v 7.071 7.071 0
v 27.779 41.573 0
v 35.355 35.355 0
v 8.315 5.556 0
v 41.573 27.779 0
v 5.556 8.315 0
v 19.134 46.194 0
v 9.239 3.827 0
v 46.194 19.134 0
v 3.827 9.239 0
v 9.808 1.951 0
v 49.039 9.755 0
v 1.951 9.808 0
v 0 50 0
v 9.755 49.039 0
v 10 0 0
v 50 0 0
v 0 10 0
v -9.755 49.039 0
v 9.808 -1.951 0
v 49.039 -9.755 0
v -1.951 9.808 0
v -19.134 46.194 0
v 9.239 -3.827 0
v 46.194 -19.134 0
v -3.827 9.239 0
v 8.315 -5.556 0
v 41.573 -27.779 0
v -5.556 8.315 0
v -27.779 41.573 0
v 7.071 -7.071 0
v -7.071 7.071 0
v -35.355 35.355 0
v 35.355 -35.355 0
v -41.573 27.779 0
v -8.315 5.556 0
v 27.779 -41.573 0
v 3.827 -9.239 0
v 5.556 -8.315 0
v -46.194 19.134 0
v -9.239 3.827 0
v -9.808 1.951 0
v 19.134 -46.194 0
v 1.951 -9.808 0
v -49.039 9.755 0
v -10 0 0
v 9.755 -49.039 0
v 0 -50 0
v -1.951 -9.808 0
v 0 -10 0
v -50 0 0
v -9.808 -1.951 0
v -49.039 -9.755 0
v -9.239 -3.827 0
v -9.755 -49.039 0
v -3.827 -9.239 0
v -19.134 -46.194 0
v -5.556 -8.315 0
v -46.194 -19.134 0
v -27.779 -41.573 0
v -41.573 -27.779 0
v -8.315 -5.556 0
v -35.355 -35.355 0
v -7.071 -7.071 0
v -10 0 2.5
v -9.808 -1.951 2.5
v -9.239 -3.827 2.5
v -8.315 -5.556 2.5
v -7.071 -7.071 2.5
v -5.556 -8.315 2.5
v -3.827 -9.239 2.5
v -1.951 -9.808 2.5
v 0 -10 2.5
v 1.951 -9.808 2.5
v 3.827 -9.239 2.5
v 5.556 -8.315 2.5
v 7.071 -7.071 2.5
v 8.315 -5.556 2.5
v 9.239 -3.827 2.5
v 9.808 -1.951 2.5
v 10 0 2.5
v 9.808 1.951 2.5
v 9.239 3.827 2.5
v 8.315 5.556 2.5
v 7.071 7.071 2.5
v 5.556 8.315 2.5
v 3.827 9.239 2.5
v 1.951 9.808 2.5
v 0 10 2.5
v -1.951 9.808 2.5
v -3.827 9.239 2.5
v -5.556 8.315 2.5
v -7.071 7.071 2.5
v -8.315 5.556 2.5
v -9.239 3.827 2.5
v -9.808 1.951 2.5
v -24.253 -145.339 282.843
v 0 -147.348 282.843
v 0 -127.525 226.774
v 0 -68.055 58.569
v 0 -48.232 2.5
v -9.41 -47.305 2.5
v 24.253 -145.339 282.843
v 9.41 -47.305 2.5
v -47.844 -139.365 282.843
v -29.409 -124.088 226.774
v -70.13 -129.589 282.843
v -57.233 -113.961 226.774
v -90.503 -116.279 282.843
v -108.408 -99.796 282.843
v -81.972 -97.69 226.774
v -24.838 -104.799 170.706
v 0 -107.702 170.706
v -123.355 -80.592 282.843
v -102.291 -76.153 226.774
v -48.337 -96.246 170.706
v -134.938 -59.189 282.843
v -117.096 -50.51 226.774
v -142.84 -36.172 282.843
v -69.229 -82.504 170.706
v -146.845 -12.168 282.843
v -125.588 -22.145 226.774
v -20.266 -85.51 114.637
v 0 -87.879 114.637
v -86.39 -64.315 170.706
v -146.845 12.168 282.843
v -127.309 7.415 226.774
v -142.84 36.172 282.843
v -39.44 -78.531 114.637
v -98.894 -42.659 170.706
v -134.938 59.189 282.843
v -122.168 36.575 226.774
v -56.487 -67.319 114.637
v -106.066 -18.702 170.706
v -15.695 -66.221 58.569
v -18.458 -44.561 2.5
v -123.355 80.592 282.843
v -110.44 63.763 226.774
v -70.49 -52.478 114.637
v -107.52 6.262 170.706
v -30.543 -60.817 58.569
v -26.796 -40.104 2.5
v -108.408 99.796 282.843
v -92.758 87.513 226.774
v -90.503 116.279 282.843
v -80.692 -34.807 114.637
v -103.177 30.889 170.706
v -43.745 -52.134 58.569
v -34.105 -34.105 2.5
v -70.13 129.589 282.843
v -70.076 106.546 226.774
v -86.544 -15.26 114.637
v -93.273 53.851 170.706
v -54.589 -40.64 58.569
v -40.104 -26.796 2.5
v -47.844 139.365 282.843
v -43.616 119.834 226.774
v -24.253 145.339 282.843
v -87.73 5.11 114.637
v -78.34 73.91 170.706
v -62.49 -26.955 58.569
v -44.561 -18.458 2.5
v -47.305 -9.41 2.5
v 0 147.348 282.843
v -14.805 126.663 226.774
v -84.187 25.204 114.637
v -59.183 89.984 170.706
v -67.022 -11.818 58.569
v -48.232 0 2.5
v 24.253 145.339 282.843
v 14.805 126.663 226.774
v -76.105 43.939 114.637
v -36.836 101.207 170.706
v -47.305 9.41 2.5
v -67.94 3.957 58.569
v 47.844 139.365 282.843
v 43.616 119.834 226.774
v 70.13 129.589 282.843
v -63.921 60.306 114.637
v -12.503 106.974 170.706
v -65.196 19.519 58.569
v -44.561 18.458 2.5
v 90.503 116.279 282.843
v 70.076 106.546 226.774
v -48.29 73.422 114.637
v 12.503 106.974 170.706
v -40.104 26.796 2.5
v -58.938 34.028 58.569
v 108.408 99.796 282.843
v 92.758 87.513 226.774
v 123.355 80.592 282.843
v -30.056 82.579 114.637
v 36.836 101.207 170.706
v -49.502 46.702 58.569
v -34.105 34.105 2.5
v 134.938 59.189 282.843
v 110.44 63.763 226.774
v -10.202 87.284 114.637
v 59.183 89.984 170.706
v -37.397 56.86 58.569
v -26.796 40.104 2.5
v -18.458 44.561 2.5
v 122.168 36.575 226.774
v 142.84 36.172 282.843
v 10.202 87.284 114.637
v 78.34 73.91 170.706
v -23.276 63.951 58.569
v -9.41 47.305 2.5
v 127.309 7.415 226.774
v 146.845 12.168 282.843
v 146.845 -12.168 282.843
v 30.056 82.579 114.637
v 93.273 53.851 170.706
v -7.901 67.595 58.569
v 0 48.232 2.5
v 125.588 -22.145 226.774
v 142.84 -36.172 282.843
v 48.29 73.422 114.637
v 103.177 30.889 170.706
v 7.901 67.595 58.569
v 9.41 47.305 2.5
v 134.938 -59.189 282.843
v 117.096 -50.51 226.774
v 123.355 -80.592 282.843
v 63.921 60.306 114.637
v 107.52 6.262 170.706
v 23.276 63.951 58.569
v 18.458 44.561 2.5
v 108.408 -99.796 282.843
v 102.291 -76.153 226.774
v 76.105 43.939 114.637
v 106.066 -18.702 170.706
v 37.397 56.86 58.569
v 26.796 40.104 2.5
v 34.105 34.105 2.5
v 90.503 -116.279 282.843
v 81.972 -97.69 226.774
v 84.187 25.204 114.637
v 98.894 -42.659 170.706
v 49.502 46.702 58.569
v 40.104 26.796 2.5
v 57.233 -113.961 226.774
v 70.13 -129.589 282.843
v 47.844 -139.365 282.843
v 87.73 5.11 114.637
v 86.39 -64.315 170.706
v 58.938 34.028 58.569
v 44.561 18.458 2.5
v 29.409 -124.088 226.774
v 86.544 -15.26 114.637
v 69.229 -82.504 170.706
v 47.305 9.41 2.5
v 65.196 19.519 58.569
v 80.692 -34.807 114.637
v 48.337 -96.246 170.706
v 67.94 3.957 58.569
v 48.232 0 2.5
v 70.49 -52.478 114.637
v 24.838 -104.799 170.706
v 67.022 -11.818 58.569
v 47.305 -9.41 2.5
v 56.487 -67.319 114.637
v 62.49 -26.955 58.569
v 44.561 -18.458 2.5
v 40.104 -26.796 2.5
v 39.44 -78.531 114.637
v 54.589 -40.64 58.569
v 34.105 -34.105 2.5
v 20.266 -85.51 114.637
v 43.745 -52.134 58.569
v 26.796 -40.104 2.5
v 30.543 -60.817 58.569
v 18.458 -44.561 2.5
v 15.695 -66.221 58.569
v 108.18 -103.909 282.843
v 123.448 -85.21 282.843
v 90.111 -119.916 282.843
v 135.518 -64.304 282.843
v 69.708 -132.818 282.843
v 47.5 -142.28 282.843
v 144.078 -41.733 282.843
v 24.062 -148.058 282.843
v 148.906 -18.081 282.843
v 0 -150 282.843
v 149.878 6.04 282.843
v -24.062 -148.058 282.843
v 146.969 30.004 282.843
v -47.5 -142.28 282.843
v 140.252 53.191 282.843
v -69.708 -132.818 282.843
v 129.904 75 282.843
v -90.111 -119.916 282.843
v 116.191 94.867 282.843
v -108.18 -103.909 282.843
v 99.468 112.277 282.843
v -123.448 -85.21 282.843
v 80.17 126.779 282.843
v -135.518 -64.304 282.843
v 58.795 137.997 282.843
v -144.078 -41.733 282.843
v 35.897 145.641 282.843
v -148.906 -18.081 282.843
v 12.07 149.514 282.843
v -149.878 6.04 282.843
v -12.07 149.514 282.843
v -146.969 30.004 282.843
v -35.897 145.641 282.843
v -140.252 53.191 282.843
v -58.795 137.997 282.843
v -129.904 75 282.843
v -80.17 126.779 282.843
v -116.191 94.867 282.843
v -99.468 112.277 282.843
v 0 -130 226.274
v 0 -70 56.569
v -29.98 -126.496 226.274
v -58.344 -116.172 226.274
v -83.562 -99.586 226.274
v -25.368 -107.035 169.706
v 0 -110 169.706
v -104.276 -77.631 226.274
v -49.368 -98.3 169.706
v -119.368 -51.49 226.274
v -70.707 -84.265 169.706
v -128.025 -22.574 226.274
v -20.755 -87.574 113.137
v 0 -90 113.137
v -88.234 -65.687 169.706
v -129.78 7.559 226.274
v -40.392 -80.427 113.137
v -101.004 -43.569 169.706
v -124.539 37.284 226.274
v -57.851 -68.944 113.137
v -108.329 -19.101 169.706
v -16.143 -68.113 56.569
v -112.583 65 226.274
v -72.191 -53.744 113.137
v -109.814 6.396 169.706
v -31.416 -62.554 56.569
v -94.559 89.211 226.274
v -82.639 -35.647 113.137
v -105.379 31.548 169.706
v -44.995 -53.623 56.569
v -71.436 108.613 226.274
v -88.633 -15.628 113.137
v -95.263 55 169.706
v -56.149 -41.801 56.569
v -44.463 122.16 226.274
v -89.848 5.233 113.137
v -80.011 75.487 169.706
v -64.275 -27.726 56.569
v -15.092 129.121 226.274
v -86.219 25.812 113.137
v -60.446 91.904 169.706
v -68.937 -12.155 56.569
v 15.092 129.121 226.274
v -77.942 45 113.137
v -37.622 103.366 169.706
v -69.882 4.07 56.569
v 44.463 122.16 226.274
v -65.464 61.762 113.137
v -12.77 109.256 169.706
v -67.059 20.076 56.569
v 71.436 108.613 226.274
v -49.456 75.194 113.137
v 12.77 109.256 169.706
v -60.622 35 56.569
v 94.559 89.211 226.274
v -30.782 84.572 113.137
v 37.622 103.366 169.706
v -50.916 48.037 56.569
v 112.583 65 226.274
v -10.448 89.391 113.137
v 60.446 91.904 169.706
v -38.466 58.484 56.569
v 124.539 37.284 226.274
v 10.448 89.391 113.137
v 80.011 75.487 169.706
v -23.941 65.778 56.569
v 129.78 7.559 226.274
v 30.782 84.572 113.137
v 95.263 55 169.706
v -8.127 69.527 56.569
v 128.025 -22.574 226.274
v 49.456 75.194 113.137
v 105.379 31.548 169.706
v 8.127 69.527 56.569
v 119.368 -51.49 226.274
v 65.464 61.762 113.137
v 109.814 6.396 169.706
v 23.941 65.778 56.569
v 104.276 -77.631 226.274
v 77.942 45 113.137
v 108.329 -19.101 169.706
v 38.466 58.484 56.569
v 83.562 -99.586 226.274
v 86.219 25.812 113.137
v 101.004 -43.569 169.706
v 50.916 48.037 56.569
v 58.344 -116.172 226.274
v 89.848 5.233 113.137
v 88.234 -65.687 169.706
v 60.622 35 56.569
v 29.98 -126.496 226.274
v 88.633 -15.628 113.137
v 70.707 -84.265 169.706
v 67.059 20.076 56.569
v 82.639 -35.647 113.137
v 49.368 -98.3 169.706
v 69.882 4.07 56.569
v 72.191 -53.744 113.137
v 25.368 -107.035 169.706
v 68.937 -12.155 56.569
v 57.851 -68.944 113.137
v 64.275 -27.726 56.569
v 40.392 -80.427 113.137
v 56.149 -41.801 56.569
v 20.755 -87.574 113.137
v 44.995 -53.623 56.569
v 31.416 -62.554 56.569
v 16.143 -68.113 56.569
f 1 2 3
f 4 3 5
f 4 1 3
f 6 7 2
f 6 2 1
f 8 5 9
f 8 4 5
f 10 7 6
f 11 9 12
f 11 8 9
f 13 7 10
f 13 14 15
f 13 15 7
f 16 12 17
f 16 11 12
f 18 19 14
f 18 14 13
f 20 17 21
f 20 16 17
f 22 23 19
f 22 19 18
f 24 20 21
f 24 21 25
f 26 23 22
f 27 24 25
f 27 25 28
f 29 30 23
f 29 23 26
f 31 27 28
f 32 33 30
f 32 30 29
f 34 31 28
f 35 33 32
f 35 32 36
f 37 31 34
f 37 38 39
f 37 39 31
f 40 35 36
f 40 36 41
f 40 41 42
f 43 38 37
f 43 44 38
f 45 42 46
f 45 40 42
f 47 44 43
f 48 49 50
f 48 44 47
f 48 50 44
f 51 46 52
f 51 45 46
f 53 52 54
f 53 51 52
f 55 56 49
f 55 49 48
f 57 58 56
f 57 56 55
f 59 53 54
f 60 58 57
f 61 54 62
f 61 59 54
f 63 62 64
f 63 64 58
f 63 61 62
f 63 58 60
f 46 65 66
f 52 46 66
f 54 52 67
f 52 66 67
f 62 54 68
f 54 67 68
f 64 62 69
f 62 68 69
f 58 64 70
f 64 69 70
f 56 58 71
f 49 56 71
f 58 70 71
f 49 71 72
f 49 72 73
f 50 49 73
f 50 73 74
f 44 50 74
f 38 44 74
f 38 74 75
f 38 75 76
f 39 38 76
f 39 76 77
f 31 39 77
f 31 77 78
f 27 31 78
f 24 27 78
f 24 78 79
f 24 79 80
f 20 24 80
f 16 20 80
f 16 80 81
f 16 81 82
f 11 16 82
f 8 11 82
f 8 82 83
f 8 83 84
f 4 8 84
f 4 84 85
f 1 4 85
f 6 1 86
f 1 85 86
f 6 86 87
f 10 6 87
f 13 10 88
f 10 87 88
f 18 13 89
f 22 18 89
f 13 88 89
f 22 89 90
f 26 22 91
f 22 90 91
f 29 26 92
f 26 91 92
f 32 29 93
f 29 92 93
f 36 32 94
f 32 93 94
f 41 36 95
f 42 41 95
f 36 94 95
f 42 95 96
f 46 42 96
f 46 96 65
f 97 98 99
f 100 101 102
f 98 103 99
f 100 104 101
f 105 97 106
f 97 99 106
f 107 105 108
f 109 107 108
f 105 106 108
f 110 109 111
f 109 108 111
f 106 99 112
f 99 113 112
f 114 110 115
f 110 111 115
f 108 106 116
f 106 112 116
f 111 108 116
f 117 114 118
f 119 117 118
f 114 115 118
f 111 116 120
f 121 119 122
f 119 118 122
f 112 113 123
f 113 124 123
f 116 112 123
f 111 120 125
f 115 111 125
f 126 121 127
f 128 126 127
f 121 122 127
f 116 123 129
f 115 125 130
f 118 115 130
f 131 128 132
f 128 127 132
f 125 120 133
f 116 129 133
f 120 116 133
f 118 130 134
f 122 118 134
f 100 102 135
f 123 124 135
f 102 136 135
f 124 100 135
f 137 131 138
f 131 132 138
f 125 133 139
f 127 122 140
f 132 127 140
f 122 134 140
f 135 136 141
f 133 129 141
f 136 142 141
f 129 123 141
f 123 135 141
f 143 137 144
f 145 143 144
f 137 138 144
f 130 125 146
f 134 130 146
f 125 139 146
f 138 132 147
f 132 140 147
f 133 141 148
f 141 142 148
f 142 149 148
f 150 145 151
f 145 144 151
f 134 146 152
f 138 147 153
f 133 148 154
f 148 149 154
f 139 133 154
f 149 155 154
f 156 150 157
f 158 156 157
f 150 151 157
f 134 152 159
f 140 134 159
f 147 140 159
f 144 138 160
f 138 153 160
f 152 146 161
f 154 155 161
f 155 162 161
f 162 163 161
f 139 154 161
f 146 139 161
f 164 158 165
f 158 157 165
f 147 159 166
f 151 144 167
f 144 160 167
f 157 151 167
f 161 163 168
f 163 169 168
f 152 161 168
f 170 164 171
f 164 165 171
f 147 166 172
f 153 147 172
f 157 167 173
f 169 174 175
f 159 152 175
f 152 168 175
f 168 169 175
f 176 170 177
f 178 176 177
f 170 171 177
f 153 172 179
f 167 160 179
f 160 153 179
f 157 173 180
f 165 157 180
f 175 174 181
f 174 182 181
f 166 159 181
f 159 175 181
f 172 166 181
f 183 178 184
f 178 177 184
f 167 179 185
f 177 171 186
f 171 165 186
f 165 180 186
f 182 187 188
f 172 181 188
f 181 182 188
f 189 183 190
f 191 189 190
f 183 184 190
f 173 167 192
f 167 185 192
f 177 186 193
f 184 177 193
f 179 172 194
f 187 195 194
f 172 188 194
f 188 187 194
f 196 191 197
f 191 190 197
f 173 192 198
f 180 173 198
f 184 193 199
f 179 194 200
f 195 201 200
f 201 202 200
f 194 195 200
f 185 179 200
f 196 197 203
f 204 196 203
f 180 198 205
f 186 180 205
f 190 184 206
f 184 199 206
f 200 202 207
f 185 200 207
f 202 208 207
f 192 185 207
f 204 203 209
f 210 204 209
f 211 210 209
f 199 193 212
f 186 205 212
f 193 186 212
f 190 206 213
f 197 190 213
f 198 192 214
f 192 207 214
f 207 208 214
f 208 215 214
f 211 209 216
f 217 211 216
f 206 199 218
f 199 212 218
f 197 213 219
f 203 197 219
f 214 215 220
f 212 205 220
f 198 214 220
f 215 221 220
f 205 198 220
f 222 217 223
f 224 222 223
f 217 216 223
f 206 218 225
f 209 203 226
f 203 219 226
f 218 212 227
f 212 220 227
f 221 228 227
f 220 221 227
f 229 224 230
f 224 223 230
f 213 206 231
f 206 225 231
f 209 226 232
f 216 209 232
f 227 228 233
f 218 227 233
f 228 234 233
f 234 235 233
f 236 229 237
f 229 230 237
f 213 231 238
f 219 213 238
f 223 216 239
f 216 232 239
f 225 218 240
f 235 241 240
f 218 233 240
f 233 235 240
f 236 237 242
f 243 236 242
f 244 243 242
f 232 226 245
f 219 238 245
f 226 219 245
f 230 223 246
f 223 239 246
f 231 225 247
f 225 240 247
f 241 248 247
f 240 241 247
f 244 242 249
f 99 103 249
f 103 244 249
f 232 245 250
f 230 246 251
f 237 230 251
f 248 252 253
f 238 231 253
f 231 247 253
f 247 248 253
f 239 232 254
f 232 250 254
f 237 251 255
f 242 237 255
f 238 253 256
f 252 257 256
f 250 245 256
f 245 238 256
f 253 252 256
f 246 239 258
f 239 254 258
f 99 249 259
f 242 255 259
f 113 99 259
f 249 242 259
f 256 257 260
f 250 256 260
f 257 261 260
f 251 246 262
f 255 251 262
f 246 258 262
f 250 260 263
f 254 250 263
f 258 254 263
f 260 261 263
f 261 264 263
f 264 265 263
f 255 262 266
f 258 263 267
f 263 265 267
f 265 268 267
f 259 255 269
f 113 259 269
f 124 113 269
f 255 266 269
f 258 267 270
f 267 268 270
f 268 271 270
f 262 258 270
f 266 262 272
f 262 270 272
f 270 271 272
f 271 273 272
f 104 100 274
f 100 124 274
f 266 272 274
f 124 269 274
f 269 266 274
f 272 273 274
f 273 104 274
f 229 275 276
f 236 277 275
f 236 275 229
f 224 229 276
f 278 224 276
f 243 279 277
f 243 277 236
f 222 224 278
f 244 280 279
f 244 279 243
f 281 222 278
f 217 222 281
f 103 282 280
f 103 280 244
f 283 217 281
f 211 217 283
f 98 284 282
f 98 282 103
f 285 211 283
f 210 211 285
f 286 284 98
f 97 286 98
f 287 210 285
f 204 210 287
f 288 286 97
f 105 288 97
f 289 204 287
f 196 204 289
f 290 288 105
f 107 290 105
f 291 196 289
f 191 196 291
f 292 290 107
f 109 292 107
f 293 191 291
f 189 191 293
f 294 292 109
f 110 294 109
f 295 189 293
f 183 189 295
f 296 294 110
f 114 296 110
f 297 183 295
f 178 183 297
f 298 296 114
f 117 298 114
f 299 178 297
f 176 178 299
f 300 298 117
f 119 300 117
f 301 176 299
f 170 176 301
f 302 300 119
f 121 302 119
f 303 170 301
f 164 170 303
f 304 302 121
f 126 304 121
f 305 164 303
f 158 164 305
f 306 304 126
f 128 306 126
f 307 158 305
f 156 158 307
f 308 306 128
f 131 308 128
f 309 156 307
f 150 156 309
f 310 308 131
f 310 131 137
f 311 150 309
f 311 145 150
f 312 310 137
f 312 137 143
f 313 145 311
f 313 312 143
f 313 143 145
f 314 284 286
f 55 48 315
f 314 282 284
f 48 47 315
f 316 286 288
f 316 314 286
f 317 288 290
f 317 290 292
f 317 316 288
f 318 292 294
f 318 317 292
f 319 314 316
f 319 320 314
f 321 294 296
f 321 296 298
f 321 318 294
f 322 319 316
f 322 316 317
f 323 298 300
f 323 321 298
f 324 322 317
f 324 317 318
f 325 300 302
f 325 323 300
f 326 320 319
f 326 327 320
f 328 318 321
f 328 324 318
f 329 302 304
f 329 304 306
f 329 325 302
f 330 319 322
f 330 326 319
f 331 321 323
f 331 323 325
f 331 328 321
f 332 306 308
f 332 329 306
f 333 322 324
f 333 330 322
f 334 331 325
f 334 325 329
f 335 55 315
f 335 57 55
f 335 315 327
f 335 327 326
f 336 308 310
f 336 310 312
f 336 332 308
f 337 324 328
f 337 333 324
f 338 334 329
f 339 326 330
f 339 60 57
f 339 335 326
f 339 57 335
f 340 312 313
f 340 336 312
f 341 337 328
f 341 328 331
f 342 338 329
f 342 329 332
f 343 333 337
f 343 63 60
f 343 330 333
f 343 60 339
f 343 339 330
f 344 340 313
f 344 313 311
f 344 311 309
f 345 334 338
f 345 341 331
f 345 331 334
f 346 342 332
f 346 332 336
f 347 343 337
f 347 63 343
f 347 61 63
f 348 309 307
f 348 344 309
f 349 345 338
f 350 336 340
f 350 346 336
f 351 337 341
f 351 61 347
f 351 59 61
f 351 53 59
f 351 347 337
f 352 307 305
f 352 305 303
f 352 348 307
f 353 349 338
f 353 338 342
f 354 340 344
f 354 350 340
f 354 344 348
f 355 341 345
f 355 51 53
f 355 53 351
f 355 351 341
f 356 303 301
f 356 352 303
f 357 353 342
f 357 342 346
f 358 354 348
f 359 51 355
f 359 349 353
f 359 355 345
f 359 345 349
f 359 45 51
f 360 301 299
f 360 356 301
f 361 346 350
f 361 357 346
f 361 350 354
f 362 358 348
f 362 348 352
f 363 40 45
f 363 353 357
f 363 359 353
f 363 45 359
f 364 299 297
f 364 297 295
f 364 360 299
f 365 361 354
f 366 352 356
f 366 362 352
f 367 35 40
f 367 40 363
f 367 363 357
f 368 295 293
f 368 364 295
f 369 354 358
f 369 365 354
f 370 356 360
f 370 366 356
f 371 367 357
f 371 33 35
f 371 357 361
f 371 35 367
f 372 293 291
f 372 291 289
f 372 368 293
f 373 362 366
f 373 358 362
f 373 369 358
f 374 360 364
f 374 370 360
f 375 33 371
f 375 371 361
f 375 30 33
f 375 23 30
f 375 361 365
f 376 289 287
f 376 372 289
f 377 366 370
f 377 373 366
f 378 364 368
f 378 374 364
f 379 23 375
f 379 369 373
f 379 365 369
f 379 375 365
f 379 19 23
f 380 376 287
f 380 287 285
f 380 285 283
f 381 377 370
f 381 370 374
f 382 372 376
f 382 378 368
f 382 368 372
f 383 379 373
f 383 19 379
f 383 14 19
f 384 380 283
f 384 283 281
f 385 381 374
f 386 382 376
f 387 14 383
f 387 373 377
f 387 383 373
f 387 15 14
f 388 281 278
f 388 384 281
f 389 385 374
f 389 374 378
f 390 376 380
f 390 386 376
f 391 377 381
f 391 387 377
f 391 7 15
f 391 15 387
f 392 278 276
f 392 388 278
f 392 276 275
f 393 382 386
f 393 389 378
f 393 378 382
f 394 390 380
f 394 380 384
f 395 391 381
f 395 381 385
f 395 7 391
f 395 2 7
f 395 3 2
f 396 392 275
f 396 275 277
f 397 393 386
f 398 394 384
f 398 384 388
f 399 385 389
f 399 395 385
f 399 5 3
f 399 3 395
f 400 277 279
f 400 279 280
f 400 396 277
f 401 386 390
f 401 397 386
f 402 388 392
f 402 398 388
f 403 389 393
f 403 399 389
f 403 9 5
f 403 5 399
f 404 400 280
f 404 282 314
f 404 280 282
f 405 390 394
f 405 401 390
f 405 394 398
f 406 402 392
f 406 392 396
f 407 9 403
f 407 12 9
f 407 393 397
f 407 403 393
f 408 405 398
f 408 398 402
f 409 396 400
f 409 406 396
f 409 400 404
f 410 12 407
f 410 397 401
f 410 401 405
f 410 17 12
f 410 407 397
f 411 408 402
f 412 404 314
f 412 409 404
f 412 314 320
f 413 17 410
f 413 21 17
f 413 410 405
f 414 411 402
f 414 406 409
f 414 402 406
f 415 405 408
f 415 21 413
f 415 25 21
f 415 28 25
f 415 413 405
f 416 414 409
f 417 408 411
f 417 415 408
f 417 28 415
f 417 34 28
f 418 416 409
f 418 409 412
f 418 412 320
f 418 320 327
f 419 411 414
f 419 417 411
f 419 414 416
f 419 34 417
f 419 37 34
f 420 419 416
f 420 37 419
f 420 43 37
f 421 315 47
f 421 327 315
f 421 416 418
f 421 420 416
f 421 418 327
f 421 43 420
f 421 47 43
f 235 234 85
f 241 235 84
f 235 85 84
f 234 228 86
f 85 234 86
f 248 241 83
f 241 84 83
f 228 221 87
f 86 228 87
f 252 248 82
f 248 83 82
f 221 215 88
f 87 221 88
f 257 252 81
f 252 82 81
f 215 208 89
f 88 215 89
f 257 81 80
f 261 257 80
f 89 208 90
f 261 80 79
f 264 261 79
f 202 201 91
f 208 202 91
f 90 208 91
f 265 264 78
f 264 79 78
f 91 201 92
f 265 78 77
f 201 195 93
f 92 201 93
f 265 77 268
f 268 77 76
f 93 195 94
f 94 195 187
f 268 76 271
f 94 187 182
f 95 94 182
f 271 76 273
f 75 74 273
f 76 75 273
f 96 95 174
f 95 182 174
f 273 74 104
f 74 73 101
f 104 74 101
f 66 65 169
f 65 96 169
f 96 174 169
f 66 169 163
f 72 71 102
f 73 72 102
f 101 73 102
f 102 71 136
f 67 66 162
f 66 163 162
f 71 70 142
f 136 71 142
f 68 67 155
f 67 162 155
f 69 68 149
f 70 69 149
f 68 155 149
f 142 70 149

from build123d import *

# Parameters (mm, degrees)
F2_T = -2.5
F4_D = 20


with BuildPart() as f1:
    # F0 (on Right) → F1 (revolve)
    with BuildSketch(Plane.YZ):
        Polygon((-50, 0), (0, 0), (0, 282.842712), (-150, 282.842712), align=None)
    revolve(axis=Axis((0, 0, 141.421356), (0, 0, -1)))

    # F2
    f2_openings = [f1.faces().sort_by_distance(p)[0] for p in [
        (0, 0, 282.842712),
    ]]
    offset(amount=F2_T, openings=f2_openings)

    # F4 (through all)
    with Locations(Plane(origin=(0, 0, 0), x_dir=(1, 0, 0), z_dir=(0, 0, -1))):
        with Locations((0, 0)):
            Hole(F4_D / 2)


solid = f1.part
